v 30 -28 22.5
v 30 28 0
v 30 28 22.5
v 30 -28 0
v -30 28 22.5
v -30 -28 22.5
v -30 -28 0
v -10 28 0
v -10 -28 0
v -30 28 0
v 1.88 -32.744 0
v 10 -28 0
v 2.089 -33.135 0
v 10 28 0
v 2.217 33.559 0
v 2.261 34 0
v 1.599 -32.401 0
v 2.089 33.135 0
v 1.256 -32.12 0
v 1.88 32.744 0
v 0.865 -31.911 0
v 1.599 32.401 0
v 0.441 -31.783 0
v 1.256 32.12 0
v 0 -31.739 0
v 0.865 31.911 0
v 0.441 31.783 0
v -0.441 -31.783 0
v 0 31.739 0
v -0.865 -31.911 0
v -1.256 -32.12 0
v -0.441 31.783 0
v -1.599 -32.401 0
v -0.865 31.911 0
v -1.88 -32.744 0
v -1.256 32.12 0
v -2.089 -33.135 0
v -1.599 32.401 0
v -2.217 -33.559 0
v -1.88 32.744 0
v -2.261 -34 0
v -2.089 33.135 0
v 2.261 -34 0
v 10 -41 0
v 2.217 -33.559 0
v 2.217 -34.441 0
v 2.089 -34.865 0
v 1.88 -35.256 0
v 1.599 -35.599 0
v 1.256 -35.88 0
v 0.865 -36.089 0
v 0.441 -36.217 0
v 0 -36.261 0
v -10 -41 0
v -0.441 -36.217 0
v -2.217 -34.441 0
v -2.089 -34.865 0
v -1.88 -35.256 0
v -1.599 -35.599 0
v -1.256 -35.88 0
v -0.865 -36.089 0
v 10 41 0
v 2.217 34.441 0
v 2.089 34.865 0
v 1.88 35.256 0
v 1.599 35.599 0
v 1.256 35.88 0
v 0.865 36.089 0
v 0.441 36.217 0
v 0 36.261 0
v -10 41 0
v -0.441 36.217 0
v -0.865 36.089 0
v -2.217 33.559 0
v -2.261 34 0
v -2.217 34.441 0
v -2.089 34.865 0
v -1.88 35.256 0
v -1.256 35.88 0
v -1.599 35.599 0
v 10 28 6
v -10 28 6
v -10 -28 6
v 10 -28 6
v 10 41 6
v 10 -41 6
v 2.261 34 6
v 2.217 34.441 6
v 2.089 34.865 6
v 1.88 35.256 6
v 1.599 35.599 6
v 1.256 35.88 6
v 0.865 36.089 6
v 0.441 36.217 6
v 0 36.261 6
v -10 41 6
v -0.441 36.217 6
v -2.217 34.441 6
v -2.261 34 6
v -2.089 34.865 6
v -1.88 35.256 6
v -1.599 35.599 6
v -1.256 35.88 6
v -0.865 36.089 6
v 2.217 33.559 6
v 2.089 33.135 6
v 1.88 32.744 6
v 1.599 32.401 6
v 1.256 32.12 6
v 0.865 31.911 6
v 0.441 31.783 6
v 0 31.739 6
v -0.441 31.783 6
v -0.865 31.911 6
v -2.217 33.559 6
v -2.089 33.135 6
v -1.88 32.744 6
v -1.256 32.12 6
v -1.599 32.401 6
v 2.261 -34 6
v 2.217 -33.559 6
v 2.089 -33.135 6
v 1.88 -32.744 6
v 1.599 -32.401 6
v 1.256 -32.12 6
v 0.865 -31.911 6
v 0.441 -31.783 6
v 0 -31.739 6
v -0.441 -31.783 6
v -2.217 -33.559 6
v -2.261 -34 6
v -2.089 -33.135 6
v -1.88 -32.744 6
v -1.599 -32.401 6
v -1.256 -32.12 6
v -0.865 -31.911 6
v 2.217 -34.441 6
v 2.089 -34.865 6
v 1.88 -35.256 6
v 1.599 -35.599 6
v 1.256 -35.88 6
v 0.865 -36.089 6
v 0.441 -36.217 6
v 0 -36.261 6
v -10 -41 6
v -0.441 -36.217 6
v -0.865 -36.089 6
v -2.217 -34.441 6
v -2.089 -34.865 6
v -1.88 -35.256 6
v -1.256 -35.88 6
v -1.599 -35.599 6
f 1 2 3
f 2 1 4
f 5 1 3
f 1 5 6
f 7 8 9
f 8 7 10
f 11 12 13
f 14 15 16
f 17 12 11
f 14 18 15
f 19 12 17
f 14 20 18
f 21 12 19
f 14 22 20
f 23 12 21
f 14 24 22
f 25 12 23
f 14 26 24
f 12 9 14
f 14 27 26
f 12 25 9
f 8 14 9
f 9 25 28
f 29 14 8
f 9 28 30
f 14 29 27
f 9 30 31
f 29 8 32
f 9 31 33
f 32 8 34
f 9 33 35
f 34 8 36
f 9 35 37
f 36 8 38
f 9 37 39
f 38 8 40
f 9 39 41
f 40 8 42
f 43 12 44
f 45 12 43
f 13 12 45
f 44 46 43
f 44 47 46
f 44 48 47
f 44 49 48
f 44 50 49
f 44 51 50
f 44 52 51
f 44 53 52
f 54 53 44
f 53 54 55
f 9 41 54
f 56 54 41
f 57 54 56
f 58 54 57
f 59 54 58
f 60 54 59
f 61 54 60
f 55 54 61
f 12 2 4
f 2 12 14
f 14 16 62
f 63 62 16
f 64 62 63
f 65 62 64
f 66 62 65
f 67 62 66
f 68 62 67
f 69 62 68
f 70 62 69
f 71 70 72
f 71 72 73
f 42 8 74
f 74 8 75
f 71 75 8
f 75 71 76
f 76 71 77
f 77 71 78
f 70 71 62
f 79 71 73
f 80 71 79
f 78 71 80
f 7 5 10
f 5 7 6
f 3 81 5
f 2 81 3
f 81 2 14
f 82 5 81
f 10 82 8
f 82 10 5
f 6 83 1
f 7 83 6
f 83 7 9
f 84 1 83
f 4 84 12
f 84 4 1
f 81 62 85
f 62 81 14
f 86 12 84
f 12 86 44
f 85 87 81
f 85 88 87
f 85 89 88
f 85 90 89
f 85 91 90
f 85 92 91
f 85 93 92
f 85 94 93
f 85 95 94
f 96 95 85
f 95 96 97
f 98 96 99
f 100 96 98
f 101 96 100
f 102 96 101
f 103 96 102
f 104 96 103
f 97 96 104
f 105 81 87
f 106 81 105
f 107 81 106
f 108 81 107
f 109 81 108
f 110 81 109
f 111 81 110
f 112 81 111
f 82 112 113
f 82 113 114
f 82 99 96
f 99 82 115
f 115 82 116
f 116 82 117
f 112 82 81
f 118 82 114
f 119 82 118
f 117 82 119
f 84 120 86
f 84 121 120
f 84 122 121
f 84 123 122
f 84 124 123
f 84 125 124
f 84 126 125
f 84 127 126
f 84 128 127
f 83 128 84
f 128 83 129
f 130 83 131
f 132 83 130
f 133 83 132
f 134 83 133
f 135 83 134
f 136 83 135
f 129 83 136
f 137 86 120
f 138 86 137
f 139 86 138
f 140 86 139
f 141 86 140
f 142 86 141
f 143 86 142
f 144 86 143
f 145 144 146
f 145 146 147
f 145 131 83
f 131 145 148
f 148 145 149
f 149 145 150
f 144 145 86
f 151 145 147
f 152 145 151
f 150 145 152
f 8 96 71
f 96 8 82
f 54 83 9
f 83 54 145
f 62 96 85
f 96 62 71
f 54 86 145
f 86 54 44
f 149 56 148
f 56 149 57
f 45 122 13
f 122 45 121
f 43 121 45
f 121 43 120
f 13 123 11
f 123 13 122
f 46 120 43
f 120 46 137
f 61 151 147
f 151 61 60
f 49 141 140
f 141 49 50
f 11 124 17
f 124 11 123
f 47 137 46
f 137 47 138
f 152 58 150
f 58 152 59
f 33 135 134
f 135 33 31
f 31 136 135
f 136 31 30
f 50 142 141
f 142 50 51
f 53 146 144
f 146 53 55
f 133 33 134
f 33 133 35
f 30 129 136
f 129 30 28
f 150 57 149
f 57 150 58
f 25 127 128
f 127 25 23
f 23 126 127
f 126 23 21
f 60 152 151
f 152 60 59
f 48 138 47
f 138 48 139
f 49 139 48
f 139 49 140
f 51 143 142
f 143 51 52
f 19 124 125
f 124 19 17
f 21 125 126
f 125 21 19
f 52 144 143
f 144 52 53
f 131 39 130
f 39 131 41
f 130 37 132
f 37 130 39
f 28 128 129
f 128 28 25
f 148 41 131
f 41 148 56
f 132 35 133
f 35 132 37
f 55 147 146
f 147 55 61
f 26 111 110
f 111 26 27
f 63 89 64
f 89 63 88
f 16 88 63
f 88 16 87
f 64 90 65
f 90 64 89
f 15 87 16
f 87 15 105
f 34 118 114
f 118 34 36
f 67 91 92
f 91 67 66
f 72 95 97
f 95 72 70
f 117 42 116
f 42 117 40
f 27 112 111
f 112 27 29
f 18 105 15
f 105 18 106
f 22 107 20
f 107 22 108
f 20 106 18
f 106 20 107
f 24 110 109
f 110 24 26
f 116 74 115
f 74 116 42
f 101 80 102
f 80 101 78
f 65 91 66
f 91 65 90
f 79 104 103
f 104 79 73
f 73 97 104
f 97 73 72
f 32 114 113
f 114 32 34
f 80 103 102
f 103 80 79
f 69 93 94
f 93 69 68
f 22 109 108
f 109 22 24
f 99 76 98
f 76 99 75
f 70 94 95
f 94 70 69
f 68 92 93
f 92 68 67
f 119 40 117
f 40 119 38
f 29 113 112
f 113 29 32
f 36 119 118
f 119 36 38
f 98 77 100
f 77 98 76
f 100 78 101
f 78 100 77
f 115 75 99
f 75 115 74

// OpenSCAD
// file: ../../../scad/lib/parent_spar_bolted.scad
// Parent modular exterior v2. mm. Geometry shared by individual part wrappers.
// Metal fasteners, ballast, Takachi box and electronics are purchased items.
/* [Dimensions] */
disk_d=225; disk_t=5;
fin_h=125; fin_w=65; fin_t=4;
beam_w=32; clearance=0.5;
float_r=100; flange_r=112.5; float_bore_r=30;
float_wall=4; float_h=180; lid_t=6;
rod_r=105.5; flange_t=6;
hub_h=32; root_x=30; root_depth=14;
$fn=96; e=0.03;
assert(disk_d<=225 && 2*flange_r<=225);
assert(fin_h>=100 && fin_h<=150 && fin_w>=50 && fin_w<=80);
assert(root_x+fin_w<disk_d/2-5);
module bore(d,h) { cylinder(d=d/cos(180/32),h=h,$fn=32); }
module bore_x(d,l) { rotate([0,90,0]) bore(d,l); }
module bore_y(d,l) { rotate([-90,0,0]) bore(d,l); }
module square_bore(h) { translate([-(beam_w+clearance)/2,-(beam_w+clearance)/2,-e]) cube([beam_w+clearance,beam_w+clearance,h+2*e]); }
module rods(h,d=6.5) { for(a=[45:90:315]) rotate([0,0,a]) translate([rod_r,0,-e]) bore(d,h+2*e); }
module lid_bolts(h) { for(a=[22.5:45:359]) rotate([0,0,a]) translate([rod_r,0,-e]) bore(4.5,h+2*e); }
module hub_pin(z) { translate([-46,10,z]) bore_x(6.5,92); }
module disk() {
 difference() { cylinder(d=disk_d,h=disk_t); square_bore(disk_t);
  for(x=[-23,23],y=[-23,23]) translate([x,y,-e]) bore(5.5,disk_t+2*e);
 }
}
module fin() {
 difference() { cube([fin_w,fin_t,fin_h]);
  for(z=[10,fin_h-hub_h+10]) translate([root_depth/2,-e,z]) bore_y(5.5,fin_t+2*e);
 }
}
module hub() {
 difference() {
  union() { translate([-30,-30,0]) cube([60,60,hub_h]);
   for(a=[0:90:270]) rotate([0,0,a]) translate([28,-16,0]) cube([16,32,hub_h]);
  }
  square_bore(hub_h);
  for(a=[0:90:270]) rotate([0,0,a]) {
   translate([root_x-clearance/2,-(fin_t+clearance)/2,-e]) cube([root_depth+clearance,fin_t+clearance,hub_h+2*e]);
   translate([root_x+root_depth/2,-17,10]) bore_y(5.5,34);
  }
  for(x=[-23,23],y=[-23,23]) translate([x,y,-e]) bore(5.5,hub_h+2*e);
  hub_pin(24);
 }
}
module beam(lower=true) {
 len=lower?180:107;
 difference() { translate([-beam_w/2,-beam_w/2,0]) cube([beam_w,beam_w,len]);
  if(lower) { for(z=[24,117]) hub_pin(z); translate([-20,0,160]) bore_x(6.5,40); translate([0,0,-e]) bore(16,8); }
  else for(z=[20,87]) translate([-20,0,z]) bore_x(6.5,40);
 }
}
module coupler() {
 // One half of a screwed split coupler. Mirror Y for the second half.
 difference() { translate([-27,0.25,0]) cube([54,26.75,64]); square_bore(64);
  for(z=[12,52]) translate([-28,0,z]) bore_x(6.5,56);
  for(x=[-22,22],z=[24,40]) translate([x,-1,z]) bore_y(5.5,29);
 }
}
module float_body() {
 difference() {
  union() { cylinder(r=float_r,h=float_h);
   translate([0,0,float_h-flange_t]) cylinder(r=flange_r,h=flange_t);
   // 45-degree underside of the flange instead of a 15 mm unsupported ledge.
   translate([0,0,float_h-flange_t-(flange_r-float_r)]) cylinder(r1=float_r,r2=flange_r,h=flange_r-float_r);
  }
  translate([0,0,-e]) cylinder(r=float_bore_r,h=float_h+2*e);
  translate([0,0,float_wall]) difference() {
   cylinder(r=float_r-float_wall,h=float_h);
   cylinder(r=float_bore_r+float_wall,h=float_h+e);
  }
  // Coupling-nut clearance; nearest cavity wall remains >=3 mm thick.
  rods(float_h,13); lid_bolts(float_h);
  for(a=[22.5:45:359]) rotate([0,0,a]) translate([rod_r,0,-e]) bore(10,float_h-flange_t+e);
 }
}
module float_lid() {
 difference() {
  cylinder(r=flange_r,h=lid_t);
  translate([0,0,-e]) cylinder(r=float_bore_r,h=lid_t+2*e);
  rods(lid_t,13); lid_bolts(lid_t);
  // Continuous face seals: 2 mm cord, 2.4 wide x 1.5 deep grooves.
  for(r=[float_bore_r+float_wall/2,float_r-float_wall/2]) translate([0,0,-e]) difference() {
   cylinder(r=r+1.2,h=1.5+e); cylinder(r=r-1.2,h=1.5+2*e);
  }
 }
}
module float_end(top=true) {
 difference() {
  union() { cylinder(r=flange_r,h=8);
   if(top) translate([-30,-30,8-e]) cube([60,60,20+e]);
   else translate([-23,-23,-40]) cube([46,46,40+e]);
  }
  rods(8);
  if(top) for(x=[-20,20],y=[-20,20]) {
   translate([x,y,-e]) bore(5.5,29);
   translate([x,y,-e]) bore(11,18+e);
  }
  if(top) for(a=[22.5:45:359]) rotate([0,0,a]) translate([rod_r,0,-e]) bore(12,8+2*e);
  else { translate([0,0,-40]) square_bore(40-e);
   translate([-24,0,-20]) bore_x(6.5,48);
  }
 }
}
module ballast_body() {
 // Open upward in print orientation. In the assembly this cup is inverted.
 difference() {
  union() { cylinder(r=45,h=51); translate([0,0,45]) cylinder(r=60,h=6);
   translate([0,0,30]) cylinder(r1=45,r2=60,h=15);
  }
  translate([0,0,6]) cylinder(r=40,h=46);
  for(x=[-23,23],y=[-23,23]) translate([x,y,-e]) bore(5.5,7);
  translate([0,0,-e]) bore(8.5,7);
  for(a=[0:90:270]) rotate([0,0,a]) translate([52,0,29]) { bore(5.5,23); bore(12,16); }
 }
}
module ballast_lid() {
 difference() { cylinder(r=60,h=6);
  for(a=[0:90:270]) rotate([0,0,a]) translate([52,0,-e]) bore(5.5,7);
  // Flooded ballast compartment: drainage, no trapped air assumption.
  for(x=[-20,0,20]) translate([x,0,-e]) bore(6,7);
 }
}
module camera_bridge() {
 // Assembly frame: local top z=78; camera seat z=8. +Y faces camera front.
 difference() {
  union() {
   translate([-30,45,70]) cube([60,90,8]);
   translate([-70,125,0]) cube([140,100,8]);
   translate([-70,125,0]) cube([140,10,78]);
   for(x=[-64,56]) translate([x,0,0]) rotate([90,0,90]) linear_extrude(8)
    polygon([[135,8],[215,8],[135,70]]);
  }
  for(x=[-20,20],y=[50,90]) translate([x,y,69]) bore(5.5,10);
  for(x=[-11,11],y=[174,206]) translate([x,y,-e]) bore(5.5,10);
 }
}
module gps_bridge() {
 // Local attachment face X=0 at deck +X; top shelf z=175.
 difference() {
  union() { translate([0,-25,0]) cube([10,50,183]);
   translate([-90,-48,175]) cube([100,96,8]);
   for(y=[-17,25]) translate([0,y,0]) rotate([90,0,0]) linear_extrude(8)
    polygon([[e,155],[e,175+e],[-80,175+e]]);
  }
  for(y=[-20,20],z=[5,45]) translate([-e,y,z]) bore_x(5.5,11);
  for(y=[-34,34]) translate([-43,y,174]) bore(4.5,10);
 }
}
// Reference antenna envelope, correct mounting ears, not a printable antenna.
module gps_reference() {
 difference() {
  union() { translate([-30,-28,0]) cube([60,56,22.5]);
   translate([-10,-41,0]) cube([20,82,6]); }
  for(y=[-34,34]) translate([0,y,-e]) bore(4.5,7);
 }
}
// main file
use <../../../scad/lib/parent_spar_bolted.scad>
gps_reference();
